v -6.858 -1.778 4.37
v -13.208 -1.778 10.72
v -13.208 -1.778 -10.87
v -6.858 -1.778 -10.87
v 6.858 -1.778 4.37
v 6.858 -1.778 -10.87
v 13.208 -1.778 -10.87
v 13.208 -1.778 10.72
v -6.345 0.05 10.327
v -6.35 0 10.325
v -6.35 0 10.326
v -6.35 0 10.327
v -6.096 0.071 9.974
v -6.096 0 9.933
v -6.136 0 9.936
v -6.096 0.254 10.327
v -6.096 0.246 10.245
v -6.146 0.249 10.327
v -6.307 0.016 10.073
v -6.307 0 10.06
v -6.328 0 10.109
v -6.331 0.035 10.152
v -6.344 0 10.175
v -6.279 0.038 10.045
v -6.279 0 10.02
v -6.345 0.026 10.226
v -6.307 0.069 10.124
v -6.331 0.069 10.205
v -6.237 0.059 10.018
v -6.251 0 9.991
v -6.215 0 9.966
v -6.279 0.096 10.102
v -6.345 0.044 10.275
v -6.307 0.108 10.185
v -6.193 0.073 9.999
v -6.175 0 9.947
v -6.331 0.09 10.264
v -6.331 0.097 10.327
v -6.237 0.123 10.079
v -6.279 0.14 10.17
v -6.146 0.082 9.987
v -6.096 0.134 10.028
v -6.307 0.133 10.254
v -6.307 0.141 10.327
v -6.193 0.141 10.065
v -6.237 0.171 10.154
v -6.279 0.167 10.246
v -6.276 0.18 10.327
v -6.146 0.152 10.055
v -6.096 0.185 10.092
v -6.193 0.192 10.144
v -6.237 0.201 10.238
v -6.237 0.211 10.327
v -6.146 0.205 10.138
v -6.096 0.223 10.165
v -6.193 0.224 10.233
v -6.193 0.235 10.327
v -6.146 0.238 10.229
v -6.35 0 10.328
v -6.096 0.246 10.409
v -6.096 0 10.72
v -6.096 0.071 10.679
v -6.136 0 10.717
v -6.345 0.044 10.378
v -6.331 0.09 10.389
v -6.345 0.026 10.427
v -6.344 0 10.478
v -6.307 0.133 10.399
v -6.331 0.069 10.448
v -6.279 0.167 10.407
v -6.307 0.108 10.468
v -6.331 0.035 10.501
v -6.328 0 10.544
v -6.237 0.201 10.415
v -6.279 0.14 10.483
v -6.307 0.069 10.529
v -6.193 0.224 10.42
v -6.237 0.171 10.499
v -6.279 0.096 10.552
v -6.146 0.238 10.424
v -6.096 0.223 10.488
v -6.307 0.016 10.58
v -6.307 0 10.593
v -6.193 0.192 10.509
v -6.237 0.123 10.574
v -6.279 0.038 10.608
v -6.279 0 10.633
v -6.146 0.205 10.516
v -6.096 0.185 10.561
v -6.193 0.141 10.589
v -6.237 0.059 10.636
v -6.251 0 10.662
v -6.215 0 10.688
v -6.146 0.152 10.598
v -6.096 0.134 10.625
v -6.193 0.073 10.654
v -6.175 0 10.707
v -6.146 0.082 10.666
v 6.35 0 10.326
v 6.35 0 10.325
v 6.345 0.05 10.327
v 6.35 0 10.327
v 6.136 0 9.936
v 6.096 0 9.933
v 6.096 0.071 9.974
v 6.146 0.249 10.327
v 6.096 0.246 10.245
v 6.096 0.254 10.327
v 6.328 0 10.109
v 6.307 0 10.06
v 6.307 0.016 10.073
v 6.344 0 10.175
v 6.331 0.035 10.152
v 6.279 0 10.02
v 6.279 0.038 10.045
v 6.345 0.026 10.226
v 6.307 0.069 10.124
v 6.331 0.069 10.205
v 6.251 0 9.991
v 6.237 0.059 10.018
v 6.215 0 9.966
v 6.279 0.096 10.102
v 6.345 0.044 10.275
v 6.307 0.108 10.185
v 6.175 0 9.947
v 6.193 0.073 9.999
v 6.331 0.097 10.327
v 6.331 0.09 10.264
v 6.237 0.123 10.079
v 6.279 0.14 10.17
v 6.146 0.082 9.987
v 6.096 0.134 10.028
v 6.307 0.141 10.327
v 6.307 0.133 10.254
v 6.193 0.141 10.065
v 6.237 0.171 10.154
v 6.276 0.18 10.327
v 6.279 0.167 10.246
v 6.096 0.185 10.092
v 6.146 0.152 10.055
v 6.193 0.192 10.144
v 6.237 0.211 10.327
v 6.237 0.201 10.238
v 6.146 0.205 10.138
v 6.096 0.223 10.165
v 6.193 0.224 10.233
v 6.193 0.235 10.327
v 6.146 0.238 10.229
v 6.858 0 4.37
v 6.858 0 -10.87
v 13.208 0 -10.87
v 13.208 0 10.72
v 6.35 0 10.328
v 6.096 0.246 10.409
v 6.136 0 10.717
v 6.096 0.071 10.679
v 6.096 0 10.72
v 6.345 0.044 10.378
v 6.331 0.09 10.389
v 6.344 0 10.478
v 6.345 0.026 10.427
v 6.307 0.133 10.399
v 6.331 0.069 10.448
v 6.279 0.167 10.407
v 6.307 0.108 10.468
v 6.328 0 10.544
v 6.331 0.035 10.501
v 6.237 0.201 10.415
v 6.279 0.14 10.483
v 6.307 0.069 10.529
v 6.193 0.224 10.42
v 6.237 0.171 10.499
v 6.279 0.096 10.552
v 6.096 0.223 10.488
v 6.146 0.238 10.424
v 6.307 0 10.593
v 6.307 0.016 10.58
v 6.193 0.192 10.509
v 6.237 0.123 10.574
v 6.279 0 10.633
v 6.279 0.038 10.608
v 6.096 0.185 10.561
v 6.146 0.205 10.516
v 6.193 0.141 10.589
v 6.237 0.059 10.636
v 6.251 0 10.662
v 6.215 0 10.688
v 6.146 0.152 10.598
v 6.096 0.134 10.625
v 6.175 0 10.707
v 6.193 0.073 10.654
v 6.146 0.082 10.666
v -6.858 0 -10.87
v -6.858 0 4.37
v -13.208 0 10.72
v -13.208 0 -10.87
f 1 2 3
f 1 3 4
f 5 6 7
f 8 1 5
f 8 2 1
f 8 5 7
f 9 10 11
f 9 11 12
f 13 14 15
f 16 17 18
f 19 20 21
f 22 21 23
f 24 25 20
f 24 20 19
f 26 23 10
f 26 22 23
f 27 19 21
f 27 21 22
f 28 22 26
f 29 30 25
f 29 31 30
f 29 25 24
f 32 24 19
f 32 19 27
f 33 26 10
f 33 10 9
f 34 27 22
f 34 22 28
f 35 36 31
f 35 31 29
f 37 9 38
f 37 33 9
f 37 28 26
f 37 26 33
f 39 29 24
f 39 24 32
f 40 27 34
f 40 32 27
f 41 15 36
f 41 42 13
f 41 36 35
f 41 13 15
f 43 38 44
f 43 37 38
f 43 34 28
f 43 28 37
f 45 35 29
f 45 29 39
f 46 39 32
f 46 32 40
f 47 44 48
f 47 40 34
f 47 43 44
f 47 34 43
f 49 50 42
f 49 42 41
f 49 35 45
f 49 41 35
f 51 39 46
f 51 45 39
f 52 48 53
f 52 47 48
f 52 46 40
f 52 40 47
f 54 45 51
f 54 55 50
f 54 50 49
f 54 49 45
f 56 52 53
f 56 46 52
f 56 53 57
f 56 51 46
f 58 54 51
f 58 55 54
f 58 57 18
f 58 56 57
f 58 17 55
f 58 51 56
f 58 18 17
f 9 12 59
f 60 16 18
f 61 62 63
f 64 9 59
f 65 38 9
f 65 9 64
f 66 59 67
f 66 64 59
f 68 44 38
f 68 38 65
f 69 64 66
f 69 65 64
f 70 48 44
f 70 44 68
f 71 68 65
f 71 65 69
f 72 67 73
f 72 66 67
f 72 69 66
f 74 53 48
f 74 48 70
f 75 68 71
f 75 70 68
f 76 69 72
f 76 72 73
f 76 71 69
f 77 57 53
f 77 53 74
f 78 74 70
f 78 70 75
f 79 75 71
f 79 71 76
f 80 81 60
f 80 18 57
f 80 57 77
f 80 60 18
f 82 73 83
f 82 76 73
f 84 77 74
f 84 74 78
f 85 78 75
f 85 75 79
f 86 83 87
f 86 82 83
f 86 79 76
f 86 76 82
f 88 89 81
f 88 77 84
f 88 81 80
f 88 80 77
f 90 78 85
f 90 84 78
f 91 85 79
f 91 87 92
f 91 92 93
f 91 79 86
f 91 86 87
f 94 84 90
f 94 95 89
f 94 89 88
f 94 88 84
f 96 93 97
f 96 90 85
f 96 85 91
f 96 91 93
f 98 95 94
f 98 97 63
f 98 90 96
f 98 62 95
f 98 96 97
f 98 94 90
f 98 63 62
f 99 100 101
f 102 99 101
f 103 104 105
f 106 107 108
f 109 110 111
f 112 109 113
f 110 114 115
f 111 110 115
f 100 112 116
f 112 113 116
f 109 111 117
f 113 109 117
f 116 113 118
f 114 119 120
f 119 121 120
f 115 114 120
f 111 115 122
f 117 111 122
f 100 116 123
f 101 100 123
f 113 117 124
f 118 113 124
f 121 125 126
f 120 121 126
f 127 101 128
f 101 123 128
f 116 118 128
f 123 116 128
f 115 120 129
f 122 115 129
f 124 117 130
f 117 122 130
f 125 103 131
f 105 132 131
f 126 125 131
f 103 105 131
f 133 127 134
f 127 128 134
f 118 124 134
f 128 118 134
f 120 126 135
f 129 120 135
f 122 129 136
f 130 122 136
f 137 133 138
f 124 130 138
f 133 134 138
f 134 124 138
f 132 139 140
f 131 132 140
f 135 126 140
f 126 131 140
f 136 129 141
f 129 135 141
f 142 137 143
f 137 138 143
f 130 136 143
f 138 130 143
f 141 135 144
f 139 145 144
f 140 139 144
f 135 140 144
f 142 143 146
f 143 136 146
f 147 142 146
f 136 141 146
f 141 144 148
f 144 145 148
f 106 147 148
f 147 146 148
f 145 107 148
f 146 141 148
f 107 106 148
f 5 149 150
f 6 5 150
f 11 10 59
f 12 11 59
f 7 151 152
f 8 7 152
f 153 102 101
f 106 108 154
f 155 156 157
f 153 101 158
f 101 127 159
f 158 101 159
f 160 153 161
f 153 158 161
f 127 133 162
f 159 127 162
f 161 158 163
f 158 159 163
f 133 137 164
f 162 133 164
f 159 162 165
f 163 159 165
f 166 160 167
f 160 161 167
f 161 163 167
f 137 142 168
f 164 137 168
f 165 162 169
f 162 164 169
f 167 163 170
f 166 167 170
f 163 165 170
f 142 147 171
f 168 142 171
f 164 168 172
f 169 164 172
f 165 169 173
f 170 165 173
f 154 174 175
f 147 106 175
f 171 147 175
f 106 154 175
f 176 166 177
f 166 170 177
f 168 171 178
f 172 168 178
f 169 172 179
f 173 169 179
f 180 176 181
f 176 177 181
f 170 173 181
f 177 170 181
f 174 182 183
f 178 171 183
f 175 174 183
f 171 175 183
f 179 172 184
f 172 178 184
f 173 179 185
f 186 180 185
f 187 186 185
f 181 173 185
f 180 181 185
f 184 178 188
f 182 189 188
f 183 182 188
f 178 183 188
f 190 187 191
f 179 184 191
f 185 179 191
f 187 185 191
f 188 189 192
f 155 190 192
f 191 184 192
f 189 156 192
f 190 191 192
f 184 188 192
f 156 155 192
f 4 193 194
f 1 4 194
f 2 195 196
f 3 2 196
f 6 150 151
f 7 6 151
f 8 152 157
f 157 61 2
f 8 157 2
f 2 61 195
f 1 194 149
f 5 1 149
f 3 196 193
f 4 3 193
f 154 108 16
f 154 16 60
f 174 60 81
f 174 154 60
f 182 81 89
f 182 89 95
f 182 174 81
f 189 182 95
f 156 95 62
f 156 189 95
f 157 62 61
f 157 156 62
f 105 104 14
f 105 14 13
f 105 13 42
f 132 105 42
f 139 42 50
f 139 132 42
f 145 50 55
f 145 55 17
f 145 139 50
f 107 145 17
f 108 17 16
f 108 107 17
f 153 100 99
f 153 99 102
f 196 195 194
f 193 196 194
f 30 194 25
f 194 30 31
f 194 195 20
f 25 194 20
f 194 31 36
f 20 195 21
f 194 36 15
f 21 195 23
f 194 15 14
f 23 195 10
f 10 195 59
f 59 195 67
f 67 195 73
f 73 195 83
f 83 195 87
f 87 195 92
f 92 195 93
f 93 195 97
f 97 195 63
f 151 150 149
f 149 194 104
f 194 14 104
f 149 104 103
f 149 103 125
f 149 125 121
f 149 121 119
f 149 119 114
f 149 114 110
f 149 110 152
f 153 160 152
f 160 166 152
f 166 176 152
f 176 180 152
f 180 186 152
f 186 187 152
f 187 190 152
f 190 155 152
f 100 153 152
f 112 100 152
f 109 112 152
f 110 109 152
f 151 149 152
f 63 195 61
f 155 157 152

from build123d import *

# Parameters (mm, degrees)
F1_DEPTH = 1.778
F3_DEPTH = 6.35
F4_R     = 0.25399


# Not quite as in the source:
# - a fillet or chamfer is up to 0.001 mm smaller than in the source, because OpenCascade refuses the exact size


with BuildPart() as f1:
    # F0 (on Front) → F1 (new body)
    with BuildSketch(Plane.XZ):
        Polygon((-6.858, -10.8697404989), (-6.858, 4.3702595011), (0, 4.3702595011), (6.858, 4.3702595011), (6.858, -10.8697404989), (13.208, -10.8697404989), (13.208, 10.7202595011), (-13.208, 10.7202595011), (-13.208, -10.8697404989), align=None)
    extrude(amount=F1_DEPTH)

    # F2 (on Right) → F3 (join, symmetric)
    with BuildSketch(Plane.YZ):
        with BuildLine():
            ThreePointArc((0.254, 10.3265595011), (0.1849893869, 10.5608220088), (0, 10.7202595011))
            Line((0, 10.7202595011), (0, 10.3265595011))
            Line((0, 10.3265595011), (0.254, 10.3265595011))
        make_face()
        with BuildLine():
            Line((0.254, 10.3265595011), (0, 10.3265595011))
            Line((0, 10.3265595011), (0, 9.9328595011))
            ThreePointArc((0, 9.9328595011), (0.1849893869, 10.0922969934), (0.254, 10.3265595011))
        make_face()
    extrude(amount=F3_DEPTH, both=True)

    # F4 (radius 0.254 in the source; OpenCascade refuses exactly that, so slightly less here)
    f4_edges = [f1.edges().sort_by_distance(p)[0] for p in [
        (-6.35, 0.254, 10.32656),
        (6.35, 0.254, 10.32656),
    ]]
    fillet(f4_edges, radius=F4_R)


solid = f1.part
